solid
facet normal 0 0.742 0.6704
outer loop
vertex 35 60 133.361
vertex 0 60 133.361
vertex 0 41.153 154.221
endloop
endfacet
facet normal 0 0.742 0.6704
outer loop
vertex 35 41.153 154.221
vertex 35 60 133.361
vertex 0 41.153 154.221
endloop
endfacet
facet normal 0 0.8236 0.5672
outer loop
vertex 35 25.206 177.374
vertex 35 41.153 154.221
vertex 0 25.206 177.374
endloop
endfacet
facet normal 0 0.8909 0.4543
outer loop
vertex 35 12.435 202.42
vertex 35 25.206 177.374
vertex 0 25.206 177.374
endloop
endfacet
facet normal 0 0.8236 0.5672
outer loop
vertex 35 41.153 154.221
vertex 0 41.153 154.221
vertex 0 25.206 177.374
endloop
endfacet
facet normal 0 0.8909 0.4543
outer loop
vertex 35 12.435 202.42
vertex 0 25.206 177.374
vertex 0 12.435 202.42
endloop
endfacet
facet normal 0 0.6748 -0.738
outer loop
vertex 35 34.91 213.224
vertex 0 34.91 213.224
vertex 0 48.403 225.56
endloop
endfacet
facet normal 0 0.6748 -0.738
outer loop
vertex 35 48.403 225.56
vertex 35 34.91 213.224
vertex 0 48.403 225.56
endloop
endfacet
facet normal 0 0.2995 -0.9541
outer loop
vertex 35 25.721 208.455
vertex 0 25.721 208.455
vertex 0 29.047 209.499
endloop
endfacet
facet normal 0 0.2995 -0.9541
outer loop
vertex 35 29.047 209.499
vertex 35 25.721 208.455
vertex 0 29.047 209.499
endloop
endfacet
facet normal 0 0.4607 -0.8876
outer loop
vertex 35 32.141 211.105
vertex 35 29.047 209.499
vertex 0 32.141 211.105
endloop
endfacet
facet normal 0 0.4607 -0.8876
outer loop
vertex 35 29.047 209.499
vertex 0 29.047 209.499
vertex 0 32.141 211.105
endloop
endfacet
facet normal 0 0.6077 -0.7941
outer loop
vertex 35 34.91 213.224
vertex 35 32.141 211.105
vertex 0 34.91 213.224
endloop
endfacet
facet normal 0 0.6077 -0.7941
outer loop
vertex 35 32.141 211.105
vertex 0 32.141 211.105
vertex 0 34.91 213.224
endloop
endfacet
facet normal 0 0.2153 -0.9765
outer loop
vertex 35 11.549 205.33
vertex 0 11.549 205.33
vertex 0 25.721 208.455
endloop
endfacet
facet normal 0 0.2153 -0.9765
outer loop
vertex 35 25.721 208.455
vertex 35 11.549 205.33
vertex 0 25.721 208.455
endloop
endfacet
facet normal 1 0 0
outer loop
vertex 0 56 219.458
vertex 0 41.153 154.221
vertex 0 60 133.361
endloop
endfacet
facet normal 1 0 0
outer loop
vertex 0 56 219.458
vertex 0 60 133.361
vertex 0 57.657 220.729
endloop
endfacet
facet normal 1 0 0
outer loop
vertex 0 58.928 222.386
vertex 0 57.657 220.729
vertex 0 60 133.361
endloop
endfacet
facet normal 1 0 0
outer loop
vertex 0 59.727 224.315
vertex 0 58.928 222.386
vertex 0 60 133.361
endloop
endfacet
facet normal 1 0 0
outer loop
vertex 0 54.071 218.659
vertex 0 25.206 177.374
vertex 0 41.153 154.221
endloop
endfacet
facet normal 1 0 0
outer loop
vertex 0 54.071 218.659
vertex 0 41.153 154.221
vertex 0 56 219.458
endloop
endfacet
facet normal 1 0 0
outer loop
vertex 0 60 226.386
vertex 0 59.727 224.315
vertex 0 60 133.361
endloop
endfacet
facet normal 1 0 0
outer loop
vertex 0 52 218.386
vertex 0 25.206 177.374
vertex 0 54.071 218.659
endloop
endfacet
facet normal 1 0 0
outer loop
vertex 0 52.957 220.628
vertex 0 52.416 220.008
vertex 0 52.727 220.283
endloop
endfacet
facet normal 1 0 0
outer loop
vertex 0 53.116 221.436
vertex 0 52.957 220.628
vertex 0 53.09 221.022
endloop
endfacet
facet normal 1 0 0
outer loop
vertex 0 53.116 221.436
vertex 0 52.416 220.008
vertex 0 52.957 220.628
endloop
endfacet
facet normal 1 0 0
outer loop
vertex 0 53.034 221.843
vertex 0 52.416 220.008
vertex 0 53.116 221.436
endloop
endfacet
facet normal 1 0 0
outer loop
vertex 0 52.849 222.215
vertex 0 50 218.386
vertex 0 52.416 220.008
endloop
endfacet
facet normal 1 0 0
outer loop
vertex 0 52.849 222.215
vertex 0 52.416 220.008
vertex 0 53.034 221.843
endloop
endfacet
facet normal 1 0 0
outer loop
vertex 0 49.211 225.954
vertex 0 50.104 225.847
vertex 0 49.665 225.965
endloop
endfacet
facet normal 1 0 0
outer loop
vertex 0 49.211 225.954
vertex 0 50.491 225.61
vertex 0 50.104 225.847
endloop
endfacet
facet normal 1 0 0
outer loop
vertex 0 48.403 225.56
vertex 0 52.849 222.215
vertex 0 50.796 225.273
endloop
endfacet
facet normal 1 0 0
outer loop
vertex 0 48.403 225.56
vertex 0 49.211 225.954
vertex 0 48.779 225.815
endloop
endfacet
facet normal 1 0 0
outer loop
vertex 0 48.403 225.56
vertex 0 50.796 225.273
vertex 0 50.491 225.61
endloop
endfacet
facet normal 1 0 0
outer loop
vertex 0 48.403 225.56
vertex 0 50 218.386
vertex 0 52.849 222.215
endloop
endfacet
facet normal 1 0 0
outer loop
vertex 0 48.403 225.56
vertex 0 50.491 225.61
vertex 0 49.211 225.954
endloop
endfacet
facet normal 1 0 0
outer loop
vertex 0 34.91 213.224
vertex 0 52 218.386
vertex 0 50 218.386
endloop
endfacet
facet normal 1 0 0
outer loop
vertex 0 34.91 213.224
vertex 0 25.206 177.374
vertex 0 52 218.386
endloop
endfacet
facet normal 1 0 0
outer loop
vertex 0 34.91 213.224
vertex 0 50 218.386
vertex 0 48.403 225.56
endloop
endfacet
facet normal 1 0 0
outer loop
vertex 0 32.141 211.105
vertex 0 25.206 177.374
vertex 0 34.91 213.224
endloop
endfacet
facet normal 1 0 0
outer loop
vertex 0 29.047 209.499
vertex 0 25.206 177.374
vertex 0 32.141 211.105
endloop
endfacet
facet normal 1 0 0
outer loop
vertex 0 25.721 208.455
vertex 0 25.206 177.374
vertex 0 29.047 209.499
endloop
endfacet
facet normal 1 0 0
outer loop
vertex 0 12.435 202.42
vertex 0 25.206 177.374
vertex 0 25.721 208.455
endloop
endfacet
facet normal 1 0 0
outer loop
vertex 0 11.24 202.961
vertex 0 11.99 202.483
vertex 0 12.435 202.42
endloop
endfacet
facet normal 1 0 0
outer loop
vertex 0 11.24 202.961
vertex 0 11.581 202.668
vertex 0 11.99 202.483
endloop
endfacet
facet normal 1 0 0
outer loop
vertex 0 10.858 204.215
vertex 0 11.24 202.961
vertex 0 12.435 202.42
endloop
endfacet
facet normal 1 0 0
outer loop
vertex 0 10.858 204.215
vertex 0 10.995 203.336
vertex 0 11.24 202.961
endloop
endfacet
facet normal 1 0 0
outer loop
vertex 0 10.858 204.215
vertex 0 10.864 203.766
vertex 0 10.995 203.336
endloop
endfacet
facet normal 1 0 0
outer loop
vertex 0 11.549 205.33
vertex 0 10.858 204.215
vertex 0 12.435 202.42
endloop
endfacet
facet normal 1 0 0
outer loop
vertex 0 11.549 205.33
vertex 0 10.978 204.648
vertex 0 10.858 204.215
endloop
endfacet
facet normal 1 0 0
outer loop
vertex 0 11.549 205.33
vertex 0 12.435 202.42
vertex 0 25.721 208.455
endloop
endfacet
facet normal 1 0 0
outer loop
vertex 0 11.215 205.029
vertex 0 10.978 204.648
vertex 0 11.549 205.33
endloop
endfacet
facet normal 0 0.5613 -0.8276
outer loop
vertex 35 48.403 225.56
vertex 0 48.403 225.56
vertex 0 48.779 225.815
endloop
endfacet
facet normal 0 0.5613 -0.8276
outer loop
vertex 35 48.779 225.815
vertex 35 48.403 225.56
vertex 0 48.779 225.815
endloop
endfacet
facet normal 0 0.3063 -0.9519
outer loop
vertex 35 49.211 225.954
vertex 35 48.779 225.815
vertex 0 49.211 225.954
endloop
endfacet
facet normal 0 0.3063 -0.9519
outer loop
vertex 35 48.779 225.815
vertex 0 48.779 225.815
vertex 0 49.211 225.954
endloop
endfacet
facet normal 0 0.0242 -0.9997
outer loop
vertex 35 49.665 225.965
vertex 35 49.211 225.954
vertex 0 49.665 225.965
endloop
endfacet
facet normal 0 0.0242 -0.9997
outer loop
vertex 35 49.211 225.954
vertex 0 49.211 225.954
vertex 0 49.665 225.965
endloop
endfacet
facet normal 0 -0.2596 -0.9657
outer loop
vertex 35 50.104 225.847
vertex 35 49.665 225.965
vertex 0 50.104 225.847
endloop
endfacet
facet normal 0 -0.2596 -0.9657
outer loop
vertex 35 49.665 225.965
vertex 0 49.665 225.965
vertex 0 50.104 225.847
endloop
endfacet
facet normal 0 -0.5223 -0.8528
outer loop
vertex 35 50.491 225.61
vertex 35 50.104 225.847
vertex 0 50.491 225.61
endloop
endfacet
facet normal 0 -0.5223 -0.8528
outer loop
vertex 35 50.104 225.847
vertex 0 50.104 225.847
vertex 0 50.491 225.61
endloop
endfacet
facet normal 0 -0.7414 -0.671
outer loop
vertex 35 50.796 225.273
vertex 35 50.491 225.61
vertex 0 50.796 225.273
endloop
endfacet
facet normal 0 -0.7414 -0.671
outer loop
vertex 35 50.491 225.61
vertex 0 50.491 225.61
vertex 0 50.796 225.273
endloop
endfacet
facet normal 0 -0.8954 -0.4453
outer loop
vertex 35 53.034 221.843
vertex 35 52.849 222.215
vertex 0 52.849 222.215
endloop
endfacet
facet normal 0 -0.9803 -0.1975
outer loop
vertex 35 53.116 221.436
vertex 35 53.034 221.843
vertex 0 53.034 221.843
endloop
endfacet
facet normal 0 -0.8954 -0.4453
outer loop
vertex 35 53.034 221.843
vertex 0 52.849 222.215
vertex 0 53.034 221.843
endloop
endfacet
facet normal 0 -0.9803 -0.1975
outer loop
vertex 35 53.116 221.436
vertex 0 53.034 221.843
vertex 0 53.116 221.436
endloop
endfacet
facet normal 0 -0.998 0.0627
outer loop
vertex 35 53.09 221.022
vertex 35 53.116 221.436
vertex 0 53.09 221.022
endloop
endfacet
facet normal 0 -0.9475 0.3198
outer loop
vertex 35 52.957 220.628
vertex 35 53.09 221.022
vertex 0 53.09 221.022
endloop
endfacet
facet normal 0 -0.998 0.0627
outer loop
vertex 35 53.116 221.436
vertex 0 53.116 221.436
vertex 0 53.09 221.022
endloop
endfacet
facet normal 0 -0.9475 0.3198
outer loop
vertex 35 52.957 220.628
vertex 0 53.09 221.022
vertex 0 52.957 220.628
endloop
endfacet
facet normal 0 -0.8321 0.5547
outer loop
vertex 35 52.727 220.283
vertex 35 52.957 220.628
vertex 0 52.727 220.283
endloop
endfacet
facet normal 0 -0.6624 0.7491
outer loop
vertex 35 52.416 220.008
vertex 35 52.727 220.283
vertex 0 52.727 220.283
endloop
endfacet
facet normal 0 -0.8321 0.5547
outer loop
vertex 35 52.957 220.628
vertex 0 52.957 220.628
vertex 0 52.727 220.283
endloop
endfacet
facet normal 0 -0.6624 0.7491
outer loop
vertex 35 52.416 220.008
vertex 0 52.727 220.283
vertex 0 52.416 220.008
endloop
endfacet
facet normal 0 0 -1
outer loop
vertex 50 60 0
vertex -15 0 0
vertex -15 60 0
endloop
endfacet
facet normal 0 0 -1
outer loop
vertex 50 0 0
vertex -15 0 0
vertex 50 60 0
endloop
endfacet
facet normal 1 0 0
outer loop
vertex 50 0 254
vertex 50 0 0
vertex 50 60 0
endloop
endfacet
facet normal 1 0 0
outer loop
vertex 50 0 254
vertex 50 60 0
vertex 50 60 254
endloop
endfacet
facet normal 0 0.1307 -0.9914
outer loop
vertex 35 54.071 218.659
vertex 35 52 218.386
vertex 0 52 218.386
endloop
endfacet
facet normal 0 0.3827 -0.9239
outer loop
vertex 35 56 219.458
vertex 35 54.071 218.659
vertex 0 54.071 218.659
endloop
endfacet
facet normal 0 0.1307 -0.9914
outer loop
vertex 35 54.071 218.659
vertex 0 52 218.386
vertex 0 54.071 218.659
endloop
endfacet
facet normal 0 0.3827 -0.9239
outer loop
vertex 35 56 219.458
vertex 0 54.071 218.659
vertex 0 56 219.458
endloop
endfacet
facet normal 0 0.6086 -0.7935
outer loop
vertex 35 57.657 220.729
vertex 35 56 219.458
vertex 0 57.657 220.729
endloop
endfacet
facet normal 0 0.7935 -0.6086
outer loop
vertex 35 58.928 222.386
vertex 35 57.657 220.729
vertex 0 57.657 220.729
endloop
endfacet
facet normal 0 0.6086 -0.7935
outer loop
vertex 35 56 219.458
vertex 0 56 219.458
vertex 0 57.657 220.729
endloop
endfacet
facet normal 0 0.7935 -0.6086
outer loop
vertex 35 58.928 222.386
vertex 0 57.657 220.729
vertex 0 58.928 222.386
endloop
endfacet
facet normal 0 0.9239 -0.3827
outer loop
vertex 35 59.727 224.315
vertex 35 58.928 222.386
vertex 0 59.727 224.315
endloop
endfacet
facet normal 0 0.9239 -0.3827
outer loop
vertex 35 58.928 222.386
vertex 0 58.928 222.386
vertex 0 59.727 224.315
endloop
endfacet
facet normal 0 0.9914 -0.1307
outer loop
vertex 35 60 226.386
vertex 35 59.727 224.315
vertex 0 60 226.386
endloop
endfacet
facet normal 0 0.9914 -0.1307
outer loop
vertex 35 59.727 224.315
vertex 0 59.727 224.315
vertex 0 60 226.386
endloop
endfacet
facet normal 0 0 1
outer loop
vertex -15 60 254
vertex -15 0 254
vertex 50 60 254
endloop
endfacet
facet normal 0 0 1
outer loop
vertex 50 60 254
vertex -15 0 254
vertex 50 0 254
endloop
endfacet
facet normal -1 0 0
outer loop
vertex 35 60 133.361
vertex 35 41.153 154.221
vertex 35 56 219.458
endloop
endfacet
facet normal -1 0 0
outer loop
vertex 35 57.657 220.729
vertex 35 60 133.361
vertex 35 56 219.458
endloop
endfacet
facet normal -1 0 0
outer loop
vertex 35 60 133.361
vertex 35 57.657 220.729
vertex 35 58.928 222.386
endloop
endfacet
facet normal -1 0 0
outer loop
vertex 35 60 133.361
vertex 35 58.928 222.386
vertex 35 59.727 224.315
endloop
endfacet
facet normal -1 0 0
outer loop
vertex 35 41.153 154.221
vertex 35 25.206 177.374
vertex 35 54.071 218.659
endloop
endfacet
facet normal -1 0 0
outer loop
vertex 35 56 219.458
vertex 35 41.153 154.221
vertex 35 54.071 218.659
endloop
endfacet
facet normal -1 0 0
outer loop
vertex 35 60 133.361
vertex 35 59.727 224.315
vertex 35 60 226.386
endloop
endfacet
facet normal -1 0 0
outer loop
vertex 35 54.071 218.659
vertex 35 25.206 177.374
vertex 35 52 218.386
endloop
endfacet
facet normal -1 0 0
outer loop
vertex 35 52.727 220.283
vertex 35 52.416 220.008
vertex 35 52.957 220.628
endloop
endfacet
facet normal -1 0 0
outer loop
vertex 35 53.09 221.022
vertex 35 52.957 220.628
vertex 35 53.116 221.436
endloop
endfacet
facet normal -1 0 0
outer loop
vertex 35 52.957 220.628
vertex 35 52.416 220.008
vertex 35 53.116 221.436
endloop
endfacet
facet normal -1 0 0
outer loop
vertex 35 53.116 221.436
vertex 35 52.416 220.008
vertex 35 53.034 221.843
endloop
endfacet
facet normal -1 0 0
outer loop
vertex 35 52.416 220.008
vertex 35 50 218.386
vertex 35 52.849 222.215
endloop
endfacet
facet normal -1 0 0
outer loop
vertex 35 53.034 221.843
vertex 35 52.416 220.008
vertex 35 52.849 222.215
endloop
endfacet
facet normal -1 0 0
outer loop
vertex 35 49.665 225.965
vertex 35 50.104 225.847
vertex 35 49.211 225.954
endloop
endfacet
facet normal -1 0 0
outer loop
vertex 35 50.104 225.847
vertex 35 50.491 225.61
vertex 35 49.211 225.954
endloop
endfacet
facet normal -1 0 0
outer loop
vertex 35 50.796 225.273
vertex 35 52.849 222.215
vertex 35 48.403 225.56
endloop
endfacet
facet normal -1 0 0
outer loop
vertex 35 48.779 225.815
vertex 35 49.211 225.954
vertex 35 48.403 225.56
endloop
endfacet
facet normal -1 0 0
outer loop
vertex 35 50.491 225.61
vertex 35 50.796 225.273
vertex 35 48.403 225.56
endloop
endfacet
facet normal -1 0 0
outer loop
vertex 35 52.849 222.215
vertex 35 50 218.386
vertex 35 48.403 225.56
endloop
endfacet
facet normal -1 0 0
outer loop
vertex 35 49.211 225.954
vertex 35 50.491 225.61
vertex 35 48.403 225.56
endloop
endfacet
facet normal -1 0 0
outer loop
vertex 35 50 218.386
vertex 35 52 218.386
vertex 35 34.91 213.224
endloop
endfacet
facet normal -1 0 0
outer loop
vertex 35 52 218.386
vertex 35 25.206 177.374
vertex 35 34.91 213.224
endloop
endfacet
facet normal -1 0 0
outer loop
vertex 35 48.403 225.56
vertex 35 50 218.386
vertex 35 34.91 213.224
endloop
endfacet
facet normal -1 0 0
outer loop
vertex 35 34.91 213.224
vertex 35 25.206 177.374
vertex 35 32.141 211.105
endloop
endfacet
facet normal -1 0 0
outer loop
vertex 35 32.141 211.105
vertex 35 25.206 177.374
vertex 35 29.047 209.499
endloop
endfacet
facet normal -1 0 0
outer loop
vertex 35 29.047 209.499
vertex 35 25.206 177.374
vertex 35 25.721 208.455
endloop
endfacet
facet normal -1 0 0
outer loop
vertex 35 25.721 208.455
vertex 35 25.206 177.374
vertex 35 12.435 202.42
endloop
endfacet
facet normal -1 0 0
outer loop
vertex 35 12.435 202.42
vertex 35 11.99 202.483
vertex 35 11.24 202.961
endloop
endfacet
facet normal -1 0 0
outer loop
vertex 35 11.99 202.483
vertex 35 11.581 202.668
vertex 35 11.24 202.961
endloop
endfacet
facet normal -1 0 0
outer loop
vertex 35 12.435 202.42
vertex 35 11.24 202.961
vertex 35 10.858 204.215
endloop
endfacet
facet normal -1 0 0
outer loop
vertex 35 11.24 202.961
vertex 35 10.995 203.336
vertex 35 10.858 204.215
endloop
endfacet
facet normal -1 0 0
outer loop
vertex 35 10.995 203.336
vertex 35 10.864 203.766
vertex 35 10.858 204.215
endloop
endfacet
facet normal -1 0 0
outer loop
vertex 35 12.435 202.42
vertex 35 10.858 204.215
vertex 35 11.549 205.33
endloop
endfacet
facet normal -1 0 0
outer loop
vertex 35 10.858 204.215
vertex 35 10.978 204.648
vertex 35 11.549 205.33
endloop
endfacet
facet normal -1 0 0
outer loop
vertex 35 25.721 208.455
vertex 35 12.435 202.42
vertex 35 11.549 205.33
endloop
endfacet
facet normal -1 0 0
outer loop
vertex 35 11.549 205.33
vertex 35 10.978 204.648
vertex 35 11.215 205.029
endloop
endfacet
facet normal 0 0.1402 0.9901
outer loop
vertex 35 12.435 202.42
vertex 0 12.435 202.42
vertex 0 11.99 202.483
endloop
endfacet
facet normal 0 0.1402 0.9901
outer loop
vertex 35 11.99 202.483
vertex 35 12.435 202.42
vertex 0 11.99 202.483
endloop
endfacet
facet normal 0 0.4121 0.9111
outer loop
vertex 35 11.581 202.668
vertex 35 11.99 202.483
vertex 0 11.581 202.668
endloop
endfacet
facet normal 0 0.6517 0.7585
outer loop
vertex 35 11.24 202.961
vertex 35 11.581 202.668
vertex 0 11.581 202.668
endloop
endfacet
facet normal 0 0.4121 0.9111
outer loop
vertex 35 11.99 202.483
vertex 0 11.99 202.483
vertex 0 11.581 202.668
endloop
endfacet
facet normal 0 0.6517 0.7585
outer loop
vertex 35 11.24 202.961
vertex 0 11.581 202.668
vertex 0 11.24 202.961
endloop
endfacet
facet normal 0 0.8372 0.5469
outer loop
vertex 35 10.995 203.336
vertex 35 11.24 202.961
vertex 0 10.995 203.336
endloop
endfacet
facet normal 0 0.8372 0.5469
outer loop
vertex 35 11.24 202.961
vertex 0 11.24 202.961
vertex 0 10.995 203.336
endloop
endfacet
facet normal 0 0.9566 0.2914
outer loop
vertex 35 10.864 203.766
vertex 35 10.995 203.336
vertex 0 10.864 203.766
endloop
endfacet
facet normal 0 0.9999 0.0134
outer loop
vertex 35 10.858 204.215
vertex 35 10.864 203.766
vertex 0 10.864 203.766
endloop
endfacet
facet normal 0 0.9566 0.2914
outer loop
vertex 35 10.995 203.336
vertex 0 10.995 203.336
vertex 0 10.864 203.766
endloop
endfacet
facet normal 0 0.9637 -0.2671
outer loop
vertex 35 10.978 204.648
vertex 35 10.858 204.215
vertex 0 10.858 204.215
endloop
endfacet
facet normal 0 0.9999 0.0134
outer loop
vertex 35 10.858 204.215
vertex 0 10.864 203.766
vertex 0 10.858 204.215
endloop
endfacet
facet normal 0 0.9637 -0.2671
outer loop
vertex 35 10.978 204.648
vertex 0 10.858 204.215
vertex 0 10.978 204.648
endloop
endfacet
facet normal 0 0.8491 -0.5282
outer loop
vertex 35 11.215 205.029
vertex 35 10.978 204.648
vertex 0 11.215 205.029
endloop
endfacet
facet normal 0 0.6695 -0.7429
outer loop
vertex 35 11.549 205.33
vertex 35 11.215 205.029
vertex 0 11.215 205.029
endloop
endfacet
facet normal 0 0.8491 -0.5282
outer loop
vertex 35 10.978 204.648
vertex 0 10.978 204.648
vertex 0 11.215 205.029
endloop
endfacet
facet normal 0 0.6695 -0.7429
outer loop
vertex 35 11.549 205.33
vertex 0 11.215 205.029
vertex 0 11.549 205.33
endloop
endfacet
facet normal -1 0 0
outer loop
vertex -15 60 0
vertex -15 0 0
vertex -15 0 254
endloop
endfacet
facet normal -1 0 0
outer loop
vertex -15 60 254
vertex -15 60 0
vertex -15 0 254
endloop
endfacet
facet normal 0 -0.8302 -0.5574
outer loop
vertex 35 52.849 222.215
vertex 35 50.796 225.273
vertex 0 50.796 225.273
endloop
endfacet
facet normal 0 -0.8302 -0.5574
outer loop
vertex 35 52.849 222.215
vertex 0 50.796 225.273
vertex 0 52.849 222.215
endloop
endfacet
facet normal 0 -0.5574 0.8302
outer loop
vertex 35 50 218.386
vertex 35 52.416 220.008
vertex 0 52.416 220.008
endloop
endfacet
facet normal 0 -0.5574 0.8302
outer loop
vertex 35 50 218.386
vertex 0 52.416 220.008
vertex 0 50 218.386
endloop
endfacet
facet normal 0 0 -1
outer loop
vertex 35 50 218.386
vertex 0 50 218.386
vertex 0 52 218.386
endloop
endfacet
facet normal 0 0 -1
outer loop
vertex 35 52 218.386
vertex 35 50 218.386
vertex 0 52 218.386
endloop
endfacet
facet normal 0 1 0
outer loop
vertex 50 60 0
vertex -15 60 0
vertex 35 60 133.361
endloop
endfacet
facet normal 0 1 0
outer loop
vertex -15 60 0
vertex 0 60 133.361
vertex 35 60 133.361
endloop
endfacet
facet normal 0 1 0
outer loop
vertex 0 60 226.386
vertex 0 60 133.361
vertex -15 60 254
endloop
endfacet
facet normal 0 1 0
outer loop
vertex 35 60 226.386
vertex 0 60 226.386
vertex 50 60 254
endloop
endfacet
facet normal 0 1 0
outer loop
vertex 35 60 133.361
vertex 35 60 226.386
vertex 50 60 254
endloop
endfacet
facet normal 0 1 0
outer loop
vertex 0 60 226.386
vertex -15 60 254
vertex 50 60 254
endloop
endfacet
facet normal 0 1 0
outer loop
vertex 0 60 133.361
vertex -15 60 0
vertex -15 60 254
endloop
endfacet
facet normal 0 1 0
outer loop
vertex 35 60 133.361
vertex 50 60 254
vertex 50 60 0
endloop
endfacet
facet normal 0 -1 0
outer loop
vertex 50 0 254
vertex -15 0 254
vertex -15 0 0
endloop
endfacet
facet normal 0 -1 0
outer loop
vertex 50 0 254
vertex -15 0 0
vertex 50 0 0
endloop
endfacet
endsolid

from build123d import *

# Parameters (mm, degrees)
F1_DEPTH = 35
F2_W     = 15
F2_H     = 254
F3_DEPTH = 60


with BuildPart() as f1:
    # F0 (on Right) → F1 (new body)
    with BuildSketch(Plane.YZ):
        with BuildLine():
            Line((0, 254), (0, 0))
            Line((0, 0), (60, 0))
            Line((60, 0), (60, 133.360773))
            ThreePointArc((60, 133.360773), (32.79815, 165.535249), (12.434966, 202.419911))
            ThreePointArc((12.434966, 202.419911), (10.913963, 203.546609), (11.548571, 205.329913))
            Line((11.548571, 205.329913), (25.72096, 208.454538))
            ThreePointArc((25.72096, 208.454538), (30.629217, 210.234525), (34.909535, 213.22421))
            Line((34.909535, 213.22421), (48.403102, 225.559899))
            ThreePointArc((48.403102, 225.559899), (49.665358, 225.965052), (50.795926, 225.272772))
            Line((50.795926, 225.272772), (52.84946, 222.214688))
            ThreePointArc((52.84946, 222.214688), (53.089616, 221.021687), (52.415852, 220.008292))
            Line((52.415852, 220.008292), (50, 218.386023))
            Line((50, 218.386023), (52, 218.386023))
            ThreePointArc((52, 218.386023), (57.656854, 220.729169), (60, 226.386023))
            Line((60, 226.386023), (60, 254))
            Line((60, 254), (0, 254))
        make_face()
    extrude(amount=F1_DEPTH)

    # F2 (on face) → F3 (join)
    with BuildSketch(Plane.XZ):
        with Locations((-7.5, 127)):
            Rectangle(F2_W, F2_H)
        with Locations((42.5, 127)):
            Rectangle(F2_W, F2_H)
    extrude(amount=-F3_DEPTH)


solid = f1.part
